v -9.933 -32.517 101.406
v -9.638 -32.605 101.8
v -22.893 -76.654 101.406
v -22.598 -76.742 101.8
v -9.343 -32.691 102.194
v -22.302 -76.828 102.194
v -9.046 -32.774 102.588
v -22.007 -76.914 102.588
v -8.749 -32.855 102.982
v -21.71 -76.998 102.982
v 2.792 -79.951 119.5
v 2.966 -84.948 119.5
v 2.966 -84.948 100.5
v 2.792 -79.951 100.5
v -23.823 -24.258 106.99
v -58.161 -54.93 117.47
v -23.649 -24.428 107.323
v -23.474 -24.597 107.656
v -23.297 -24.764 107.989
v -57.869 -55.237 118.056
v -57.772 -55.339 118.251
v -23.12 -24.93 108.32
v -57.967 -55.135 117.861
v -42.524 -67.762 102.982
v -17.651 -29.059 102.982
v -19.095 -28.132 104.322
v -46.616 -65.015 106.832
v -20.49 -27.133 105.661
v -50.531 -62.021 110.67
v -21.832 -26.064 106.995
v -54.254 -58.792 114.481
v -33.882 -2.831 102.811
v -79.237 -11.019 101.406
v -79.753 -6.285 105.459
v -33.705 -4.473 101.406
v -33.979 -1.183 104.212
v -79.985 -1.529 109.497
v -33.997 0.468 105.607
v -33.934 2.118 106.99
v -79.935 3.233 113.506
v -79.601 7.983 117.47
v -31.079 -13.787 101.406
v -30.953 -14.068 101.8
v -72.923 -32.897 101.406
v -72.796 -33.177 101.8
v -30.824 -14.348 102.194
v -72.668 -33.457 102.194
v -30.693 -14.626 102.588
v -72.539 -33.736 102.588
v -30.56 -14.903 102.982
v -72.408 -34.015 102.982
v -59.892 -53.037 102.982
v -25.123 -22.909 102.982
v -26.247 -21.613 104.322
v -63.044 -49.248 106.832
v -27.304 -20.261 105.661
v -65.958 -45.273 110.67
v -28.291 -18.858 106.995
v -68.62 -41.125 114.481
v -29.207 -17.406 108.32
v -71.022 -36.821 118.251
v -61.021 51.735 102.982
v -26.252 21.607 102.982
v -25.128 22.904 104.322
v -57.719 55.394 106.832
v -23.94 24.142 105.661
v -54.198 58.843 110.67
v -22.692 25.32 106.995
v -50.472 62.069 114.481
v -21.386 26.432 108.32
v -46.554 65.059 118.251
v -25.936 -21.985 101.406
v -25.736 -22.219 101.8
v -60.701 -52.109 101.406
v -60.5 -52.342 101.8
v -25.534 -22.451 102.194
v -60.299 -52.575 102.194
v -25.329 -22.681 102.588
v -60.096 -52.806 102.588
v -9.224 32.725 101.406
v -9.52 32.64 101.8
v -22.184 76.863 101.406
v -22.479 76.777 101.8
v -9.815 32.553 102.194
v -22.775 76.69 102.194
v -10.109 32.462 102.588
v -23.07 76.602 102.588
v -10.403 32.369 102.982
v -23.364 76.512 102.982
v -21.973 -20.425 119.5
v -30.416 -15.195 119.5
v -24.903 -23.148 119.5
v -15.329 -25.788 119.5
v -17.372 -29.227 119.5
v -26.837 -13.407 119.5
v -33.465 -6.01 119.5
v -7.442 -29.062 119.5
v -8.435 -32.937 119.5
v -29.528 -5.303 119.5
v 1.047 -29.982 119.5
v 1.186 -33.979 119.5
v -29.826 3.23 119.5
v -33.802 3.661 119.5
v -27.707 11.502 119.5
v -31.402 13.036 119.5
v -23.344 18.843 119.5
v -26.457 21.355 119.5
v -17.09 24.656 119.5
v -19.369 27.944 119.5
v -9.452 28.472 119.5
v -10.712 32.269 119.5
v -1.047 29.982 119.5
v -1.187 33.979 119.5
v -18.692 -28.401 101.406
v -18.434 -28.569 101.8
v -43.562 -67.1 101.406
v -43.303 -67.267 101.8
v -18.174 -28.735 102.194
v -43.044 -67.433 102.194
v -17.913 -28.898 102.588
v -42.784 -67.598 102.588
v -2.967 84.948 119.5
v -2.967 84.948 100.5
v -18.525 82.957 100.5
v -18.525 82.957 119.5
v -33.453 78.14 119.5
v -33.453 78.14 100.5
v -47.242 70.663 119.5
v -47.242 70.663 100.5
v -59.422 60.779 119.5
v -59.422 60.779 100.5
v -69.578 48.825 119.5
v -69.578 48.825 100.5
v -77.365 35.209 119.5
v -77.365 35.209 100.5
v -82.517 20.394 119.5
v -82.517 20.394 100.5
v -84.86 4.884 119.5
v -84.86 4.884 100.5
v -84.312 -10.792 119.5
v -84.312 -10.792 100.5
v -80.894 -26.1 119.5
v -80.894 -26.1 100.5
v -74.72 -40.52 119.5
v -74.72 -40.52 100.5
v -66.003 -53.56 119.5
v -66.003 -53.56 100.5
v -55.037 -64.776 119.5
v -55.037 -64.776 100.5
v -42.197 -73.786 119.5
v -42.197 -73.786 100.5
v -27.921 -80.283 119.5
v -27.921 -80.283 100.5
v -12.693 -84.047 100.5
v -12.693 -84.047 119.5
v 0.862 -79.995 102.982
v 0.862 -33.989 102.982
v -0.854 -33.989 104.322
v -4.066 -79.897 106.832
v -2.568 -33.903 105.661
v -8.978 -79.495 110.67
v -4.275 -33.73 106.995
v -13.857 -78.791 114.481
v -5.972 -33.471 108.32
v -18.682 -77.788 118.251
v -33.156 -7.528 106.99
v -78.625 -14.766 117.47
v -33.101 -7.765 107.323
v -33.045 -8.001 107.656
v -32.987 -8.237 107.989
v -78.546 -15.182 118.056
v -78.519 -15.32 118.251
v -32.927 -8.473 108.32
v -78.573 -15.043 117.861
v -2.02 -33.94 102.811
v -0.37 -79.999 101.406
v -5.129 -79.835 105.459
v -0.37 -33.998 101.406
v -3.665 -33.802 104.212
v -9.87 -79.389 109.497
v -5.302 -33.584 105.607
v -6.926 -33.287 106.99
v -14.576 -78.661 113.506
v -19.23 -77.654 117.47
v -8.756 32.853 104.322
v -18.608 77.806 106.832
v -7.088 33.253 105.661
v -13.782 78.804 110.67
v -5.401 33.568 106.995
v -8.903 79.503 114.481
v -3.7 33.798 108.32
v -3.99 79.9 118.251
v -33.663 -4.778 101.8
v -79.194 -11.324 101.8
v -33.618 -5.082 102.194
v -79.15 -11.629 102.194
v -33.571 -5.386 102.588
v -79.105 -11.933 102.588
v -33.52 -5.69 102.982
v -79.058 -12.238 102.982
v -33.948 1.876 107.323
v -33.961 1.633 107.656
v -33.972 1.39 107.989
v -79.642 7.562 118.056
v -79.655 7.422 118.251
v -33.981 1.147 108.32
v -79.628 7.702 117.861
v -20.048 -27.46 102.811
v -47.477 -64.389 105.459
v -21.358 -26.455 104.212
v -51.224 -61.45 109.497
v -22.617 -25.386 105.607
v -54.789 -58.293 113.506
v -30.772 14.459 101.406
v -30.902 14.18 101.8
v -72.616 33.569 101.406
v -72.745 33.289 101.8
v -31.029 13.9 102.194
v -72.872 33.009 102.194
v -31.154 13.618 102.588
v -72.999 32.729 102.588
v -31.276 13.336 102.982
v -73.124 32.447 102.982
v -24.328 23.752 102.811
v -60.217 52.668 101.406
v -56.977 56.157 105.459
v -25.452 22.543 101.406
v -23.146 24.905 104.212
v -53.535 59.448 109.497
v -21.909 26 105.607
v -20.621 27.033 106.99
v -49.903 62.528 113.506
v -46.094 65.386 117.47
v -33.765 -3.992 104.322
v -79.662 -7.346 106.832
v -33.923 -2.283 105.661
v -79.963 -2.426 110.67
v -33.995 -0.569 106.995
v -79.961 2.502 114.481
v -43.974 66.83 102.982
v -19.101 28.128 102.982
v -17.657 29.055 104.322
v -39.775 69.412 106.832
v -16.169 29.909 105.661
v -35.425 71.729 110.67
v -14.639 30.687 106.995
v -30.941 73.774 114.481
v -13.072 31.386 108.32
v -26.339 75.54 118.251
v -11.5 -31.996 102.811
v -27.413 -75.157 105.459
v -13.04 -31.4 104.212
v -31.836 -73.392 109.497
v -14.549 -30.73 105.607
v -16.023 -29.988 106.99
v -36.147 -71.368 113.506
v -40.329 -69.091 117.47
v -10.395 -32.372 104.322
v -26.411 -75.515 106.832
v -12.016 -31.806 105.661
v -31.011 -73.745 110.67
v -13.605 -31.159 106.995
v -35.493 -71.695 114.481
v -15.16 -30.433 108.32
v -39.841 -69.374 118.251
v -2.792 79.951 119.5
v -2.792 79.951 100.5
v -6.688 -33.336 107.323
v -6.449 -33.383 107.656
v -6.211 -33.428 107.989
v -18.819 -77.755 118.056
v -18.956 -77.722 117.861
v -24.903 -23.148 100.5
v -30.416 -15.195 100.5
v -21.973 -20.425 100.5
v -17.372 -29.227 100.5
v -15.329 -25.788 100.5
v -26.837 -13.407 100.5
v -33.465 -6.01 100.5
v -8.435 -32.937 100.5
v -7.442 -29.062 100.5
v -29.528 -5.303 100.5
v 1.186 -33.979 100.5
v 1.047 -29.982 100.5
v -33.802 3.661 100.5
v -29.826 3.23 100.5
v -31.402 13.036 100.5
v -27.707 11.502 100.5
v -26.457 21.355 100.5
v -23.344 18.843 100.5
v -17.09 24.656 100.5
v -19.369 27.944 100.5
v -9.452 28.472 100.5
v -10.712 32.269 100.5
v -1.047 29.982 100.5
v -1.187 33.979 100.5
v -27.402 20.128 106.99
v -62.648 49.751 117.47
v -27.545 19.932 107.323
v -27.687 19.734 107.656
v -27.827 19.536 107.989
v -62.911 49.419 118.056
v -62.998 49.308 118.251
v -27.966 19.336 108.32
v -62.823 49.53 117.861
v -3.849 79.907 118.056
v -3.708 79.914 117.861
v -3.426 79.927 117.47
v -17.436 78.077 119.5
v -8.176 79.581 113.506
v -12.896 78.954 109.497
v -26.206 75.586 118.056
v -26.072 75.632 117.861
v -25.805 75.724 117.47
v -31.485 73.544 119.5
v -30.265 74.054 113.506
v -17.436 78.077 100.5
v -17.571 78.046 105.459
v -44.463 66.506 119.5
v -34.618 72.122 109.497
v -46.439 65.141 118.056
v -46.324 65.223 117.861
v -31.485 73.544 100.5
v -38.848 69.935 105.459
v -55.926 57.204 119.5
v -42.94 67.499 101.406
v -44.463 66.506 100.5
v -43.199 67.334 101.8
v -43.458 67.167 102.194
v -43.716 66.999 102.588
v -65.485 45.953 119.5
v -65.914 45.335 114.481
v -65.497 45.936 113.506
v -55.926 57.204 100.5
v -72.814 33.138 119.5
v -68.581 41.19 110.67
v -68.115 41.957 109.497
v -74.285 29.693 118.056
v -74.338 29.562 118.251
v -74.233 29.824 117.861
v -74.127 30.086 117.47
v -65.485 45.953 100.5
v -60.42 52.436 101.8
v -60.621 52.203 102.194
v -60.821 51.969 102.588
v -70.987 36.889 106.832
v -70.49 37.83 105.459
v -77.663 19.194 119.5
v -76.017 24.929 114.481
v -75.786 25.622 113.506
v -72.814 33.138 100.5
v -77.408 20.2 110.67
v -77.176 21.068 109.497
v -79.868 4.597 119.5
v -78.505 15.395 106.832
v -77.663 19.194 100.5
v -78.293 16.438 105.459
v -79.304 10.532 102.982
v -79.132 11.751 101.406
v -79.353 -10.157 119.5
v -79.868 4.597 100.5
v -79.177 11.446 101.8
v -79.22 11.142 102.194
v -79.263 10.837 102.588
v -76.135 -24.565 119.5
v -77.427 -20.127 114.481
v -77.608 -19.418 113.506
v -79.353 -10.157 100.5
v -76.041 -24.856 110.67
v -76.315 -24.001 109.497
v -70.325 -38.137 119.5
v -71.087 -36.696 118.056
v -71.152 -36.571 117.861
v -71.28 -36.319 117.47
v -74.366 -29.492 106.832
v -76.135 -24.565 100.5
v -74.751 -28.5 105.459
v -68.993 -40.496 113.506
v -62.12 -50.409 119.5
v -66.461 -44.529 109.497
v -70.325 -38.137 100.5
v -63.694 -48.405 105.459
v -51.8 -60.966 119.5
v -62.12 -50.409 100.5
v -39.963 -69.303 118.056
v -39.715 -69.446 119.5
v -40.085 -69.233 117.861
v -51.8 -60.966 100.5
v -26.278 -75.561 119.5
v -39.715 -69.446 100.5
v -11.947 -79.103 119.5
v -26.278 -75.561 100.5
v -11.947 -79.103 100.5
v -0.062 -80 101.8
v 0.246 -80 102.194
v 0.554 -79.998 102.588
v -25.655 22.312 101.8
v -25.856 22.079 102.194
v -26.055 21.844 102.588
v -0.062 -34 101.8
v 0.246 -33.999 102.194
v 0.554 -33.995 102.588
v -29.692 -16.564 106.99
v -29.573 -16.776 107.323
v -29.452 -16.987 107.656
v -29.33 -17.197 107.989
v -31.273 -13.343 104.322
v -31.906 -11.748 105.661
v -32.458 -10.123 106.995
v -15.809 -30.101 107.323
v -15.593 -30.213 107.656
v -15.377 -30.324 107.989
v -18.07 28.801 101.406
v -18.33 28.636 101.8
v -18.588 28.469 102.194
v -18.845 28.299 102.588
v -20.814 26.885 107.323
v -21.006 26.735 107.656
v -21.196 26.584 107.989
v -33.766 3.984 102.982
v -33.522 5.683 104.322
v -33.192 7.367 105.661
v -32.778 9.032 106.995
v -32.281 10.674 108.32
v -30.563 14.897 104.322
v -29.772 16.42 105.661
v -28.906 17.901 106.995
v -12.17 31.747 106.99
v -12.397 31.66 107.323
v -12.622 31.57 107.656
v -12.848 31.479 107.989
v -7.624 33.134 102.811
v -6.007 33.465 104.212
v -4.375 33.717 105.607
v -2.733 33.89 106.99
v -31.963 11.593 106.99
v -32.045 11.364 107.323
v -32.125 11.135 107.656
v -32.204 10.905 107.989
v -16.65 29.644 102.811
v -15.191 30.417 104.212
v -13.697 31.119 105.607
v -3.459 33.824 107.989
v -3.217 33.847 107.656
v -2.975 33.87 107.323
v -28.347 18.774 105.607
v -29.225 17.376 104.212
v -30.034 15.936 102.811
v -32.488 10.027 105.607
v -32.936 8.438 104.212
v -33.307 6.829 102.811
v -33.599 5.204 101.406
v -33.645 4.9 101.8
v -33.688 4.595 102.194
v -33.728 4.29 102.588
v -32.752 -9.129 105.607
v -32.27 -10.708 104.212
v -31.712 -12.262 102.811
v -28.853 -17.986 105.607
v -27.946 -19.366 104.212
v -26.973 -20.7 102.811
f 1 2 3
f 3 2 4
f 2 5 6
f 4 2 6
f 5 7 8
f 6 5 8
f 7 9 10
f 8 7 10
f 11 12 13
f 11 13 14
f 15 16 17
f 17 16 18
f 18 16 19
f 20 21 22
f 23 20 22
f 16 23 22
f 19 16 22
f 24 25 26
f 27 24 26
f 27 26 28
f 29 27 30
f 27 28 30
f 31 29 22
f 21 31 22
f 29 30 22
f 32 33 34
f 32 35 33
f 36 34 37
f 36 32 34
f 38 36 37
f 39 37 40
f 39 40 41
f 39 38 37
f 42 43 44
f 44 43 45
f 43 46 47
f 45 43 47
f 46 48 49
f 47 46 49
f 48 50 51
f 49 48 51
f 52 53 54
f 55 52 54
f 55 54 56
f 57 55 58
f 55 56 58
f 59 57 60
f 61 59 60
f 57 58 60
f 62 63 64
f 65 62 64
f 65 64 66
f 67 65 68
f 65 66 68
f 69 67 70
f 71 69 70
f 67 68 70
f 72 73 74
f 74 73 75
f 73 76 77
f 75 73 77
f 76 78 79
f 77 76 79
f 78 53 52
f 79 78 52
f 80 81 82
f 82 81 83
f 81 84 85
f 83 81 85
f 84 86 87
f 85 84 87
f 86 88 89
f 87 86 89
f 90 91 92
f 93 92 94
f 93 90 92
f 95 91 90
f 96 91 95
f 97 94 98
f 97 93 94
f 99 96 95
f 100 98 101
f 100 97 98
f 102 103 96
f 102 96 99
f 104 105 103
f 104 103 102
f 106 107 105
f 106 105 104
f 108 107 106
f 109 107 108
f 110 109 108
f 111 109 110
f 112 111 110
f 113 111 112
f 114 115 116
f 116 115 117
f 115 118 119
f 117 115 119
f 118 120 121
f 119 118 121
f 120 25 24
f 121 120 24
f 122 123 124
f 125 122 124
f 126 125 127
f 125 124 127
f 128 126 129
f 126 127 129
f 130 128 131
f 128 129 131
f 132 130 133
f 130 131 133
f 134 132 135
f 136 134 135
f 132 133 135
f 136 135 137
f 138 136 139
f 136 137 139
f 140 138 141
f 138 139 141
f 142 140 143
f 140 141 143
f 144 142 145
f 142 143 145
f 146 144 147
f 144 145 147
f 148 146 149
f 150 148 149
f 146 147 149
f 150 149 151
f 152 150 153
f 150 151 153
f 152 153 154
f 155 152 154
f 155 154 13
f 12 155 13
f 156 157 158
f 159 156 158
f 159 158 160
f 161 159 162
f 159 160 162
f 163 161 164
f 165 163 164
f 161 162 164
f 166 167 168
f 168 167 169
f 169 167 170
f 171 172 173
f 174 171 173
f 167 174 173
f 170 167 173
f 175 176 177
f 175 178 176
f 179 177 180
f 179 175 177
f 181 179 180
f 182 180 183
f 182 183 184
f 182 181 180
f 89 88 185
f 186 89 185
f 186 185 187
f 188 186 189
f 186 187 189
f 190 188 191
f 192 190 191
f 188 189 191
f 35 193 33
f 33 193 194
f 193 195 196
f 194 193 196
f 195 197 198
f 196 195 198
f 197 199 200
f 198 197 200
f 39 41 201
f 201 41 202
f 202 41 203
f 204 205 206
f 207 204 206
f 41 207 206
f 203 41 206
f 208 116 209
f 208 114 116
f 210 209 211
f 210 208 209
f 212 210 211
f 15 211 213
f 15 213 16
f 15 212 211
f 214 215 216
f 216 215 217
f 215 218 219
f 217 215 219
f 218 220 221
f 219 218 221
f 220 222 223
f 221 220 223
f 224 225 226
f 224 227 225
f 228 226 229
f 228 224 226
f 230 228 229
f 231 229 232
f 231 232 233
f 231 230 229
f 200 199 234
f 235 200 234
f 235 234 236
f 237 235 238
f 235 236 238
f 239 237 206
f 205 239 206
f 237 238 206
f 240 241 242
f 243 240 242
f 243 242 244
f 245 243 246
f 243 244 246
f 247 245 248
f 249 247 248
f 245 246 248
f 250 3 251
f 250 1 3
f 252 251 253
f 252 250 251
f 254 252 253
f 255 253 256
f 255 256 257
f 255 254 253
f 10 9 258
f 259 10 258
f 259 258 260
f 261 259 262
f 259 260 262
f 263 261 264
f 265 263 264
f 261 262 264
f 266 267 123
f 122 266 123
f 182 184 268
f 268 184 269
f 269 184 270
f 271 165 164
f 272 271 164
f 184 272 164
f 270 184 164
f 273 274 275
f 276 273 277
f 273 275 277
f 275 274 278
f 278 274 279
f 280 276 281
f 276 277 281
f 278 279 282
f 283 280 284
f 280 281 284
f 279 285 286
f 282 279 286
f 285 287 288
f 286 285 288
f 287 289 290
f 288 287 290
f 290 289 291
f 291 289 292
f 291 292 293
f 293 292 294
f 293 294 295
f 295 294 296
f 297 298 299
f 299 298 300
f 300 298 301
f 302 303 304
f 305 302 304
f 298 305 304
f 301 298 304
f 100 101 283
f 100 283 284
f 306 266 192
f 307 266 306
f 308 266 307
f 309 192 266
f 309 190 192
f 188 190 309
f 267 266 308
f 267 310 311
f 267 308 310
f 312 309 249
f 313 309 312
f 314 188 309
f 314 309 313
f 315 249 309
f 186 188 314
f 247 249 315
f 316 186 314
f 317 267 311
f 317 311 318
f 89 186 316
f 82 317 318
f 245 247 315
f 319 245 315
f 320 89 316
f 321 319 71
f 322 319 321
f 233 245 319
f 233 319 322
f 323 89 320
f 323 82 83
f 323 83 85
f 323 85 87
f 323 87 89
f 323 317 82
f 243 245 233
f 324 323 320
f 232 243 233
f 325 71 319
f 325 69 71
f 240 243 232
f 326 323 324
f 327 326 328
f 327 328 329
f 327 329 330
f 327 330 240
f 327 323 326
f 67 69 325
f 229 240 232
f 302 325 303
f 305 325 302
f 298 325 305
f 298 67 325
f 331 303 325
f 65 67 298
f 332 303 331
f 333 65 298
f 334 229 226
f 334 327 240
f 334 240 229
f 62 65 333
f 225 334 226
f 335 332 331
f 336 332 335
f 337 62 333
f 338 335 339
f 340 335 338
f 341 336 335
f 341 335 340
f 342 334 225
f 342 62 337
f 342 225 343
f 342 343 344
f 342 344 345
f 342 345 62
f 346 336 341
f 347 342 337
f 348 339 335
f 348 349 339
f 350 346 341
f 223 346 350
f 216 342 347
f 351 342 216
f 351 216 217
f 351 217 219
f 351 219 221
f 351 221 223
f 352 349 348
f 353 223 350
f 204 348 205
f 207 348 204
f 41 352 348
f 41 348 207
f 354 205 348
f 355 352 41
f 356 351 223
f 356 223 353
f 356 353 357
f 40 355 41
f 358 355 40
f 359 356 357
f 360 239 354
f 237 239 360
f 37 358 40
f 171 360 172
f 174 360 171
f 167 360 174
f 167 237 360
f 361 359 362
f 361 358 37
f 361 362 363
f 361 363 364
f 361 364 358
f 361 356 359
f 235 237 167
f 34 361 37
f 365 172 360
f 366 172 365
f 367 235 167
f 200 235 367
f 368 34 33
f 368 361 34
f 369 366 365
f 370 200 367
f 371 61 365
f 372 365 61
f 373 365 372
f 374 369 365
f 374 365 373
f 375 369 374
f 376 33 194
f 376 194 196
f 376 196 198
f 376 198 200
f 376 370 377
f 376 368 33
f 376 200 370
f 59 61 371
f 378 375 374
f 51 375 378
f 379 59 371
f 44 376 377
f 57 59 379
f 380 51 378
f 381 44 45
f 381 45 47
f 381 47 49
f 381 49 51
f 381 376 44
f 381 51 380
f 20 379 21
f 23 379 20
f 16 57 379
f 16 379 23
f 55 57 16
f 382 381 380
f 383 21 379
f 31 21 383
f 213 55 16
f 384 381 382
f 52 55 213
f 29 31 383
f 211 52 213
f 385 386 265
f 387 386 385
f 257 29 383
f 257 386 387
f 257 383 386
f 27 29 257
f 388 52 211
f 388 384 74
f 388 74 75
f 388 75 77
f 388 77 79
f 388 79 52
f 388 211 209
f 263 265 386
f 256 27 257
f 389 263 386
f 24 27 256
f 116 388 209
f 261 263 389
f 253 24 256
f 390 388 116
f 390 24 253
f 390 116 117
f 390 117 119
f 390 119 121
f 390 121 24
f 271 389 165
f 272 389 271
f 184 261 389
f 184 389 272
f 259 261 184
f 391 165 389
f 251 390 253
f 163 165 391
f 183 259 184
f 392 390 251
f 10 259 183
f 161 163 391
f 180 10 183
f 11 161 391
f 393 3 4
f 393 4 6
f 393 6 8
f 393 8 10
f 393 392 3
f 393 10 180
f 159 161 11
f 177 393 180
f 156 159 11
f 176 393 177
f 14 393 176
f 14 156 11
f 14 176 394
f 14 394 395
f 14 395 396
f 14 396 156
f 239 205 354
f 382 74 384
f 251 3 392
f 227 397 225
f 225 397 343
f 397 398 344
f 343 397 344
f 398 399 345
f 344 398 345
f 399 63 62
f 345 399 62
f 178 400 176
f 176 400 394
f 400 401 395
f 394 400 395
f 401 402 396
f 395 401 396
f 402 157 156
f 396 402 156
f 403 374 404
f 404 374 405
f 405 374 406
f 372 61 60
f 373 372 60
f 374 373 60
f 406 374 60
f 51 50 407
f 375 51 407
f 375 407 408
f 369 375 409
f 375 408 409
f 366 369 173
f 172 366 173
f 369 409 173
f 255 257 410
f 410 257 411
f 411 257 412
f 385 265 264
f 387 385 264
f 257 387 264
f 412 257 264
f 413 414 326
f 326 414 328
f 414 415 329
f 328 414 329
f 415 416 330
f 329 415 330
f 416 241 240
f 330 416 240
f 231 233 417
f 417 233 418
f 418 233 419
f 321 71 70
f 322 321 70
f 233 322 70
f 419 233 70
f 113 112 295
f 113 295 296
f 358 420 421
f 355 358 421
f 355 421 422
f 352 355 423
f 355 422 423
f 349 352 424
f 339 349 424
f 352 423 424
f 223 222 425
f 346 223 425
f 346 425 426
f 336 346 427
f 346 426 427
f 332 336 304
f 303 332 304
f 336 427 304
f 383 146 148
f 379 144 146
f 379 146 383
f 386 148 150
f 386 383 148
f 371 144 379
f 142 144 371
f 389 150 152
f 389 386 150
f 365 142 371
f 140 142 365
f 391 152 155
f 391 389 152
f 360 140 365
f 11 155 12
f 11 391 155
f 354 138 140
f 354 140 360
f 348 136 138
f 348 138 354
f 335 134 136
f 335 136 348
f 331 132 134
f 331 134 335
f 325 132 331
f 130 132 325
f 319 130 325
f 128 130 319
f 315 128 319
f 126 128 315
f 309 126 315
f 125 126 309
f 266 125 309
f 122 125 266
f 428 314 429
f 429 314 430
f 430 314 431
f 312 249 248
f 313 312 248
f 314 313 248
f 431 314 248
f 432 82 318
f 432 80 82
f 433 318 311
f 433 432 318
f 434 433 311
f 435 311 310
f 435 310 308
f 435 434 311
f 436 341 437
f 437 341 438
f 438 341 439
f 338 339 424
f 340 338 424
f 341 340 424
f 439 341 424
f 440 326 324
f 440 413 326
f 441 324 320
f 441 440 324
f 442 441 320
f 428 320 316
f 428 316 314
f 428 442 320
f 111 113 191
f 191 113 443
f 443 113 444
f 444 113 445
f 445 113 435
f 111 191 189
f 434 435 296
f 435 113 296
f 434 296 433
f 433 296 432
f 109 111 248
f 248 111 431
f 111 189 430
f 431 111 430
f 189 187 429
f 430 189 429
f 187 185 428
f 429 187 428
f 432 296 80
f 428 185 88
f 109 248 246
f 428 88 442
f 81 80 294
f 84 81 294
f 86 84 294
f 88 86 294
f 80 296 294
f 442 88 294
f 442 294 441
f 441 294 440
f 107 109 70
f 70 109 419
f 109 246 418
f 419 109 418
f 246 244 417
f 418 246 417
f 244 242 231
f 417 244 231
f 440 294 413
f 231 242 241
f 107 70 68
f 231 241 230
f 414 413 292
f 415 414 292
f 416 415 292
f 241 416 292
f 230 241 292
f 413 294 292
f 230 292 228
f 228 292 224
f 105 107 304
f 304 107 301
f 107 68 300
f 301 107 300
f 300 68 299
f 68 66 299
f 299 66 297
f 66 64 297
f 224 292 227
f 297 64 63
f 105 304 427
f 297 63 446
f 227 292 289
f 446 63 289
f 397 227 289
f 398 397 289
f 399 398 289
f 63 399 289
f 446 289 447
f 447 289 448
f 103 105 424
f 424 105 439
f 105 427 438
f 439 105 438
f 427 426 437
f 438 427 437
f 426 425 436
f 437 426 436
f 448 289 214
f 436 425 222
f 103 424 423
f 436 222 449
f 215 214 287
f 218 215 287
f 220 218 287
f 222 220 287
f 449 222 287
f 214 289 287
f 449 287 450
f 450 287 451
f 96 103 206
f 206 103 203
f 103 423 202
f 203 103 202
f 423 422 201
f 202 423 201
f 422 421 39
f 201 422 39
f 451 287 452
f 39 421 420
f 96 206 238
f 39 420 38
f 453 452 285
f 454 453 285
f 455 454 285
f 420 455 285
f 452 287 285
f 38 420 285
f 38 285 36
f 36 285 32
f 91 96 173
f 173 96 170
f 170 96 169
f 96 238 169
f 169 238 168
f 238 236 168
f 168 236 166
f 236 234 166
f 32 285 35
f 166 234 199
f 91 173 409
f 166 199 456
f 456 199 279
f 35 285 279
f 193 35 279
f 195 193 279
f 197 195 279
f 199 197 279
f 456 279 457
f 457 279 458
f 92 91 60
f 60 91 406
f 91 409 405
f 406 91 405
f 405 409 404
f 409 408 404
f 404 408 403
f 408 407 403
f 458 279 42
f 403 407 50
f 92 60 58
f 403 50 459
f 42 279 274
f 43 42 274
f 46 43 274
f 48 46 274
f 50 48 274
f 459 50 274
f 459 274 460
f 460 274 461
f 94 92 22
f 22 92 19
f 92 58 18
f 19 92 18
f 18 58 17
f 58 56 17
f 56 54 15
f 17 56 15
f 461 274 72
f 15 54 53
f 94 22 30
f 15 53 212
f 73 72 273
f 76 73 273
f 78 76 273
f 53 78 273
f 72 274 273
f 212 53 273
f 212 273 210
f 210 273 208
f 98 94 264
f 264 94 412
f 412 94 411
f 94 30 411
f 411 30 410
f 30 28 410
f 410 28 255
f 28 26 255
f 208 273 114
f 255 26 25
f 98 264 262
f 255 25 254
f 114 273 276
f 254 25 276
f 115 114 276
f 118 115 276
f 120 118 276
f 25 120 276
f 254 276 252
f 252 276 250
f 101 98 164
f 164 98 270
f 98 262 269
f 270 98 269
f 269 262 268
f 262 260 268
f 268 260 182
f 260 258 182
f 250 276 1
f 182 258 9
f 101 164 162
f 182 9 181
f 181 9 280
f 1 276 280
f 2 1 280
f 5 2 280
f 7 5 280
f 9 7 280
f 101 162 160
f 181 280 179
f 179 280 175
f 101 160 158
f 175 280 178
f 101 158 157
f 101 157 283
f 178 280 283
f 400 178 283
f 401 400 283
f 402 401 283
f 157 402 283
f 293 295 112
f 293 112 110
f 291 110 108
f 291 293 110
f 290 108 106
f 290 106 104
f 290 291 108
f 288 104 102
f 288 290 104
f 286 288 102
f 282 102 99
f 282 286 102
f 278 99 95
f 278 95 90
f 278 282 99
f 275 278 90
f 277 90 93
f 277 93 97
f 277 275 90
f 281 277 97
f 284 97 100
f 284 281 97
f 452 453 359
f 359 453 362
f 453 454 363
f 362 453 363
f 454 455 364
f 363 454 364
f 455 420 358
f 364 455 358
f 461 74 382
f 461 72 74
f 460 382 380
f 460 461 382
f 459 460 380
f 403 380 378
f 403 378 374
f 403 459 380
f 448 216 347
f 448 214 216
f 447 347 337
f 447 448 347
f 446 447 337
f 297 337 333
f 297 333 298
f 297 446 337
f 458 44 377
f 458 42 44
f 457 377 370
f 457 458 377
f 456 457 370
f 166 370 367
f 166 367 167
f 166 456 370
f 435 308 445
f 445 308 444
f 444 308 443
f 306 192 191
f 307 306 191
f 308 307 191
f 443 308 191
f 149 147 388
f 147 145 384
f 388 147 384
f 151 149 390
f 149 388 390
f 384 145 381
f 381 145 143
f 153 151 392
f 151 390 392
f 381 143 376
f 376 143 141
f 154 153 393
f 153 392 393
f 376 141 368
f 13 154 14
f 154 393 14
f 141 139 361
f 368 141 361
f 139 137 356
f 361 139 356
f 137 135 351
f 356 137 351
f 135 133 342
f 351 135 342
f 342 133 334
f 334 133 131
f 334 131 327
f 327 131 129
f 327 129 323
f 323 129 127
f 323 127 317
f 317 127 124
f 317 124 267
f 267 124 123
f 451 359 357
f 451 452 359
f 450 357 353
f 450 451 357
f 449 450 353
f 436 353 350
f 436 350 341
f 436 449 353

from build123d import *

# Parameters (mm, degrees)
BOX003_W                  = 500
BOX003_H                  = 500
BOX003_DEPTH              = 500
BOX003_PLACEMENT_ANGLE    = 2
TUBE037_R                 = 85
TUBE037_R_2               = 80
TUBE037_DEPTH             = 19
TUBE036_R                 = 100
TUBE036_R_2               = 80
TUBE036_DEPTH             = 200
PAD034_DEPTH              = 100
PAD035_DEPTH              = 2
COMMON016_PLACEMENT_ANGLE = 38
ARRAY015_COUNT            = 22
ARRAY015_PLACEMENT_ANGLE  = 180
TUBE038_R                 = 34
TUBE038_R_2               = 30
TUBE038_DEPTH             = 19


with BuildPart() as cube003:
    # Box003 → Box003 (new body)
    with BuildSketch(Plane.XY):
        with Locations((250, 250)):
            Rectangle(BOX003_W, BOX003_H)
    extrude(amount=BOX003_DEPTH)


with BuildPart() as cube003_1:
    # Box003 placement: moved
    add(cube003.part.moved(Location((8.73, -250, 0))).rotate(Axis((8.73, -250, 0), (0, 0, 1)), BOX003_PLACEMENT_ANGLE))


with BuildPart() as tube037:
    # Tube037 → Tube037 (new body)
    with BuildSketch(Plane.XY.offset(100.5)):
        Circle(TUBE037_R)
        Circle(TUBE037_R_2, mode=Mode.SUBTRACT)
    extrude(amount=TUBE037_DEPTH)


with BuildPart() as tube036:
    # Tube036 → Tube036 (new body)
    with BuildSketch(Plane.XY):
        Circle(TUBE036_R)
        Circle(TUBE036_R_2, mode=Mode.SUBTRACT)
    extrude(amount=TUBE036_DEPTH)


with BuildPart() as body035:
    # Sketch034 → Pad034 (new body)
    with BuildSketch(Plane.XZ):
        Polygon((0, 0), (0, 2), (26, 0.9), (26, 0), align=None)
    extrude(amount=PAD034_DEPTH)


with BuildPart() as body035_1:
    # Body035 placement: moved
    add(body035.part.moved(Location((-5, 0, 5))))


with BuildPart() as cut010:
    # Sketch035 → Pad035 (new body)
    with BuildSketch(Plane.XY):
        Polygon((0, 0), (0, -52), (25.94305, -47.924315), (8.5, 0), align=None)
    extrude(amount=PAD035_DEPTH)


with BuildPart() as cut010_1:
    # Body036 placement: moved
    add(cut010.part.moved(Location((-5, -33, 5))))

    # Common016: intersect Body035
    add(body035_1.part, mode=Mode.INTERSECT)


with BuildPart() as cut010_2:
    # Common016 placement: moved
    add(cut010_1.part.rotate(Axis((0, 0, 0), (0, 1, 0)), COMMON016_PLACEMENT_ANGLE))

    # Array015: Cut010 ×22 about axis
    array015_axis = Axis((0, 0, 0), (0, 0, 1))


with BuildPart() as cut010_3:
    add(cut010_2.part)
    for i in range(1, ARRAY015_COUNT):
        add(cut010_2.part.rotate(array015_axis, i * 360 / ARRAY015_COUNT))


with BuildPart() as cut010_4:
    # Array015 placement: moved
    add(cut010_3.part.moved(Location((0, 0, 110))).rotate(Axis((0, 0, 110), (0, 1, 0)), ARRAY015_PLACEMENT_ANGLE))

    # Cut010: cut Tube036
    add(tube036.part, mode=Mode.SUBTRACT)


with BuildPart() as stator1h2:
    # Tube038 → Tube038 (new body)
    with BuildSketch(Plane.XY.offset(100.5)):
        Circle(TUBE038_R)
        Circle(TUBE038_R_2, mode=Mode.SUBTRACT)
    extrude(amount=TUBE038_DEPTH)

    # Fusion017: union Tube037, Cut010
    add(tube037.part)
    add(cut010_4.part)

    # Cut011: cut Cube003
    add(cube003_1.part, mode=Mode.SUBTRACT)


solid = stator1h2.part
